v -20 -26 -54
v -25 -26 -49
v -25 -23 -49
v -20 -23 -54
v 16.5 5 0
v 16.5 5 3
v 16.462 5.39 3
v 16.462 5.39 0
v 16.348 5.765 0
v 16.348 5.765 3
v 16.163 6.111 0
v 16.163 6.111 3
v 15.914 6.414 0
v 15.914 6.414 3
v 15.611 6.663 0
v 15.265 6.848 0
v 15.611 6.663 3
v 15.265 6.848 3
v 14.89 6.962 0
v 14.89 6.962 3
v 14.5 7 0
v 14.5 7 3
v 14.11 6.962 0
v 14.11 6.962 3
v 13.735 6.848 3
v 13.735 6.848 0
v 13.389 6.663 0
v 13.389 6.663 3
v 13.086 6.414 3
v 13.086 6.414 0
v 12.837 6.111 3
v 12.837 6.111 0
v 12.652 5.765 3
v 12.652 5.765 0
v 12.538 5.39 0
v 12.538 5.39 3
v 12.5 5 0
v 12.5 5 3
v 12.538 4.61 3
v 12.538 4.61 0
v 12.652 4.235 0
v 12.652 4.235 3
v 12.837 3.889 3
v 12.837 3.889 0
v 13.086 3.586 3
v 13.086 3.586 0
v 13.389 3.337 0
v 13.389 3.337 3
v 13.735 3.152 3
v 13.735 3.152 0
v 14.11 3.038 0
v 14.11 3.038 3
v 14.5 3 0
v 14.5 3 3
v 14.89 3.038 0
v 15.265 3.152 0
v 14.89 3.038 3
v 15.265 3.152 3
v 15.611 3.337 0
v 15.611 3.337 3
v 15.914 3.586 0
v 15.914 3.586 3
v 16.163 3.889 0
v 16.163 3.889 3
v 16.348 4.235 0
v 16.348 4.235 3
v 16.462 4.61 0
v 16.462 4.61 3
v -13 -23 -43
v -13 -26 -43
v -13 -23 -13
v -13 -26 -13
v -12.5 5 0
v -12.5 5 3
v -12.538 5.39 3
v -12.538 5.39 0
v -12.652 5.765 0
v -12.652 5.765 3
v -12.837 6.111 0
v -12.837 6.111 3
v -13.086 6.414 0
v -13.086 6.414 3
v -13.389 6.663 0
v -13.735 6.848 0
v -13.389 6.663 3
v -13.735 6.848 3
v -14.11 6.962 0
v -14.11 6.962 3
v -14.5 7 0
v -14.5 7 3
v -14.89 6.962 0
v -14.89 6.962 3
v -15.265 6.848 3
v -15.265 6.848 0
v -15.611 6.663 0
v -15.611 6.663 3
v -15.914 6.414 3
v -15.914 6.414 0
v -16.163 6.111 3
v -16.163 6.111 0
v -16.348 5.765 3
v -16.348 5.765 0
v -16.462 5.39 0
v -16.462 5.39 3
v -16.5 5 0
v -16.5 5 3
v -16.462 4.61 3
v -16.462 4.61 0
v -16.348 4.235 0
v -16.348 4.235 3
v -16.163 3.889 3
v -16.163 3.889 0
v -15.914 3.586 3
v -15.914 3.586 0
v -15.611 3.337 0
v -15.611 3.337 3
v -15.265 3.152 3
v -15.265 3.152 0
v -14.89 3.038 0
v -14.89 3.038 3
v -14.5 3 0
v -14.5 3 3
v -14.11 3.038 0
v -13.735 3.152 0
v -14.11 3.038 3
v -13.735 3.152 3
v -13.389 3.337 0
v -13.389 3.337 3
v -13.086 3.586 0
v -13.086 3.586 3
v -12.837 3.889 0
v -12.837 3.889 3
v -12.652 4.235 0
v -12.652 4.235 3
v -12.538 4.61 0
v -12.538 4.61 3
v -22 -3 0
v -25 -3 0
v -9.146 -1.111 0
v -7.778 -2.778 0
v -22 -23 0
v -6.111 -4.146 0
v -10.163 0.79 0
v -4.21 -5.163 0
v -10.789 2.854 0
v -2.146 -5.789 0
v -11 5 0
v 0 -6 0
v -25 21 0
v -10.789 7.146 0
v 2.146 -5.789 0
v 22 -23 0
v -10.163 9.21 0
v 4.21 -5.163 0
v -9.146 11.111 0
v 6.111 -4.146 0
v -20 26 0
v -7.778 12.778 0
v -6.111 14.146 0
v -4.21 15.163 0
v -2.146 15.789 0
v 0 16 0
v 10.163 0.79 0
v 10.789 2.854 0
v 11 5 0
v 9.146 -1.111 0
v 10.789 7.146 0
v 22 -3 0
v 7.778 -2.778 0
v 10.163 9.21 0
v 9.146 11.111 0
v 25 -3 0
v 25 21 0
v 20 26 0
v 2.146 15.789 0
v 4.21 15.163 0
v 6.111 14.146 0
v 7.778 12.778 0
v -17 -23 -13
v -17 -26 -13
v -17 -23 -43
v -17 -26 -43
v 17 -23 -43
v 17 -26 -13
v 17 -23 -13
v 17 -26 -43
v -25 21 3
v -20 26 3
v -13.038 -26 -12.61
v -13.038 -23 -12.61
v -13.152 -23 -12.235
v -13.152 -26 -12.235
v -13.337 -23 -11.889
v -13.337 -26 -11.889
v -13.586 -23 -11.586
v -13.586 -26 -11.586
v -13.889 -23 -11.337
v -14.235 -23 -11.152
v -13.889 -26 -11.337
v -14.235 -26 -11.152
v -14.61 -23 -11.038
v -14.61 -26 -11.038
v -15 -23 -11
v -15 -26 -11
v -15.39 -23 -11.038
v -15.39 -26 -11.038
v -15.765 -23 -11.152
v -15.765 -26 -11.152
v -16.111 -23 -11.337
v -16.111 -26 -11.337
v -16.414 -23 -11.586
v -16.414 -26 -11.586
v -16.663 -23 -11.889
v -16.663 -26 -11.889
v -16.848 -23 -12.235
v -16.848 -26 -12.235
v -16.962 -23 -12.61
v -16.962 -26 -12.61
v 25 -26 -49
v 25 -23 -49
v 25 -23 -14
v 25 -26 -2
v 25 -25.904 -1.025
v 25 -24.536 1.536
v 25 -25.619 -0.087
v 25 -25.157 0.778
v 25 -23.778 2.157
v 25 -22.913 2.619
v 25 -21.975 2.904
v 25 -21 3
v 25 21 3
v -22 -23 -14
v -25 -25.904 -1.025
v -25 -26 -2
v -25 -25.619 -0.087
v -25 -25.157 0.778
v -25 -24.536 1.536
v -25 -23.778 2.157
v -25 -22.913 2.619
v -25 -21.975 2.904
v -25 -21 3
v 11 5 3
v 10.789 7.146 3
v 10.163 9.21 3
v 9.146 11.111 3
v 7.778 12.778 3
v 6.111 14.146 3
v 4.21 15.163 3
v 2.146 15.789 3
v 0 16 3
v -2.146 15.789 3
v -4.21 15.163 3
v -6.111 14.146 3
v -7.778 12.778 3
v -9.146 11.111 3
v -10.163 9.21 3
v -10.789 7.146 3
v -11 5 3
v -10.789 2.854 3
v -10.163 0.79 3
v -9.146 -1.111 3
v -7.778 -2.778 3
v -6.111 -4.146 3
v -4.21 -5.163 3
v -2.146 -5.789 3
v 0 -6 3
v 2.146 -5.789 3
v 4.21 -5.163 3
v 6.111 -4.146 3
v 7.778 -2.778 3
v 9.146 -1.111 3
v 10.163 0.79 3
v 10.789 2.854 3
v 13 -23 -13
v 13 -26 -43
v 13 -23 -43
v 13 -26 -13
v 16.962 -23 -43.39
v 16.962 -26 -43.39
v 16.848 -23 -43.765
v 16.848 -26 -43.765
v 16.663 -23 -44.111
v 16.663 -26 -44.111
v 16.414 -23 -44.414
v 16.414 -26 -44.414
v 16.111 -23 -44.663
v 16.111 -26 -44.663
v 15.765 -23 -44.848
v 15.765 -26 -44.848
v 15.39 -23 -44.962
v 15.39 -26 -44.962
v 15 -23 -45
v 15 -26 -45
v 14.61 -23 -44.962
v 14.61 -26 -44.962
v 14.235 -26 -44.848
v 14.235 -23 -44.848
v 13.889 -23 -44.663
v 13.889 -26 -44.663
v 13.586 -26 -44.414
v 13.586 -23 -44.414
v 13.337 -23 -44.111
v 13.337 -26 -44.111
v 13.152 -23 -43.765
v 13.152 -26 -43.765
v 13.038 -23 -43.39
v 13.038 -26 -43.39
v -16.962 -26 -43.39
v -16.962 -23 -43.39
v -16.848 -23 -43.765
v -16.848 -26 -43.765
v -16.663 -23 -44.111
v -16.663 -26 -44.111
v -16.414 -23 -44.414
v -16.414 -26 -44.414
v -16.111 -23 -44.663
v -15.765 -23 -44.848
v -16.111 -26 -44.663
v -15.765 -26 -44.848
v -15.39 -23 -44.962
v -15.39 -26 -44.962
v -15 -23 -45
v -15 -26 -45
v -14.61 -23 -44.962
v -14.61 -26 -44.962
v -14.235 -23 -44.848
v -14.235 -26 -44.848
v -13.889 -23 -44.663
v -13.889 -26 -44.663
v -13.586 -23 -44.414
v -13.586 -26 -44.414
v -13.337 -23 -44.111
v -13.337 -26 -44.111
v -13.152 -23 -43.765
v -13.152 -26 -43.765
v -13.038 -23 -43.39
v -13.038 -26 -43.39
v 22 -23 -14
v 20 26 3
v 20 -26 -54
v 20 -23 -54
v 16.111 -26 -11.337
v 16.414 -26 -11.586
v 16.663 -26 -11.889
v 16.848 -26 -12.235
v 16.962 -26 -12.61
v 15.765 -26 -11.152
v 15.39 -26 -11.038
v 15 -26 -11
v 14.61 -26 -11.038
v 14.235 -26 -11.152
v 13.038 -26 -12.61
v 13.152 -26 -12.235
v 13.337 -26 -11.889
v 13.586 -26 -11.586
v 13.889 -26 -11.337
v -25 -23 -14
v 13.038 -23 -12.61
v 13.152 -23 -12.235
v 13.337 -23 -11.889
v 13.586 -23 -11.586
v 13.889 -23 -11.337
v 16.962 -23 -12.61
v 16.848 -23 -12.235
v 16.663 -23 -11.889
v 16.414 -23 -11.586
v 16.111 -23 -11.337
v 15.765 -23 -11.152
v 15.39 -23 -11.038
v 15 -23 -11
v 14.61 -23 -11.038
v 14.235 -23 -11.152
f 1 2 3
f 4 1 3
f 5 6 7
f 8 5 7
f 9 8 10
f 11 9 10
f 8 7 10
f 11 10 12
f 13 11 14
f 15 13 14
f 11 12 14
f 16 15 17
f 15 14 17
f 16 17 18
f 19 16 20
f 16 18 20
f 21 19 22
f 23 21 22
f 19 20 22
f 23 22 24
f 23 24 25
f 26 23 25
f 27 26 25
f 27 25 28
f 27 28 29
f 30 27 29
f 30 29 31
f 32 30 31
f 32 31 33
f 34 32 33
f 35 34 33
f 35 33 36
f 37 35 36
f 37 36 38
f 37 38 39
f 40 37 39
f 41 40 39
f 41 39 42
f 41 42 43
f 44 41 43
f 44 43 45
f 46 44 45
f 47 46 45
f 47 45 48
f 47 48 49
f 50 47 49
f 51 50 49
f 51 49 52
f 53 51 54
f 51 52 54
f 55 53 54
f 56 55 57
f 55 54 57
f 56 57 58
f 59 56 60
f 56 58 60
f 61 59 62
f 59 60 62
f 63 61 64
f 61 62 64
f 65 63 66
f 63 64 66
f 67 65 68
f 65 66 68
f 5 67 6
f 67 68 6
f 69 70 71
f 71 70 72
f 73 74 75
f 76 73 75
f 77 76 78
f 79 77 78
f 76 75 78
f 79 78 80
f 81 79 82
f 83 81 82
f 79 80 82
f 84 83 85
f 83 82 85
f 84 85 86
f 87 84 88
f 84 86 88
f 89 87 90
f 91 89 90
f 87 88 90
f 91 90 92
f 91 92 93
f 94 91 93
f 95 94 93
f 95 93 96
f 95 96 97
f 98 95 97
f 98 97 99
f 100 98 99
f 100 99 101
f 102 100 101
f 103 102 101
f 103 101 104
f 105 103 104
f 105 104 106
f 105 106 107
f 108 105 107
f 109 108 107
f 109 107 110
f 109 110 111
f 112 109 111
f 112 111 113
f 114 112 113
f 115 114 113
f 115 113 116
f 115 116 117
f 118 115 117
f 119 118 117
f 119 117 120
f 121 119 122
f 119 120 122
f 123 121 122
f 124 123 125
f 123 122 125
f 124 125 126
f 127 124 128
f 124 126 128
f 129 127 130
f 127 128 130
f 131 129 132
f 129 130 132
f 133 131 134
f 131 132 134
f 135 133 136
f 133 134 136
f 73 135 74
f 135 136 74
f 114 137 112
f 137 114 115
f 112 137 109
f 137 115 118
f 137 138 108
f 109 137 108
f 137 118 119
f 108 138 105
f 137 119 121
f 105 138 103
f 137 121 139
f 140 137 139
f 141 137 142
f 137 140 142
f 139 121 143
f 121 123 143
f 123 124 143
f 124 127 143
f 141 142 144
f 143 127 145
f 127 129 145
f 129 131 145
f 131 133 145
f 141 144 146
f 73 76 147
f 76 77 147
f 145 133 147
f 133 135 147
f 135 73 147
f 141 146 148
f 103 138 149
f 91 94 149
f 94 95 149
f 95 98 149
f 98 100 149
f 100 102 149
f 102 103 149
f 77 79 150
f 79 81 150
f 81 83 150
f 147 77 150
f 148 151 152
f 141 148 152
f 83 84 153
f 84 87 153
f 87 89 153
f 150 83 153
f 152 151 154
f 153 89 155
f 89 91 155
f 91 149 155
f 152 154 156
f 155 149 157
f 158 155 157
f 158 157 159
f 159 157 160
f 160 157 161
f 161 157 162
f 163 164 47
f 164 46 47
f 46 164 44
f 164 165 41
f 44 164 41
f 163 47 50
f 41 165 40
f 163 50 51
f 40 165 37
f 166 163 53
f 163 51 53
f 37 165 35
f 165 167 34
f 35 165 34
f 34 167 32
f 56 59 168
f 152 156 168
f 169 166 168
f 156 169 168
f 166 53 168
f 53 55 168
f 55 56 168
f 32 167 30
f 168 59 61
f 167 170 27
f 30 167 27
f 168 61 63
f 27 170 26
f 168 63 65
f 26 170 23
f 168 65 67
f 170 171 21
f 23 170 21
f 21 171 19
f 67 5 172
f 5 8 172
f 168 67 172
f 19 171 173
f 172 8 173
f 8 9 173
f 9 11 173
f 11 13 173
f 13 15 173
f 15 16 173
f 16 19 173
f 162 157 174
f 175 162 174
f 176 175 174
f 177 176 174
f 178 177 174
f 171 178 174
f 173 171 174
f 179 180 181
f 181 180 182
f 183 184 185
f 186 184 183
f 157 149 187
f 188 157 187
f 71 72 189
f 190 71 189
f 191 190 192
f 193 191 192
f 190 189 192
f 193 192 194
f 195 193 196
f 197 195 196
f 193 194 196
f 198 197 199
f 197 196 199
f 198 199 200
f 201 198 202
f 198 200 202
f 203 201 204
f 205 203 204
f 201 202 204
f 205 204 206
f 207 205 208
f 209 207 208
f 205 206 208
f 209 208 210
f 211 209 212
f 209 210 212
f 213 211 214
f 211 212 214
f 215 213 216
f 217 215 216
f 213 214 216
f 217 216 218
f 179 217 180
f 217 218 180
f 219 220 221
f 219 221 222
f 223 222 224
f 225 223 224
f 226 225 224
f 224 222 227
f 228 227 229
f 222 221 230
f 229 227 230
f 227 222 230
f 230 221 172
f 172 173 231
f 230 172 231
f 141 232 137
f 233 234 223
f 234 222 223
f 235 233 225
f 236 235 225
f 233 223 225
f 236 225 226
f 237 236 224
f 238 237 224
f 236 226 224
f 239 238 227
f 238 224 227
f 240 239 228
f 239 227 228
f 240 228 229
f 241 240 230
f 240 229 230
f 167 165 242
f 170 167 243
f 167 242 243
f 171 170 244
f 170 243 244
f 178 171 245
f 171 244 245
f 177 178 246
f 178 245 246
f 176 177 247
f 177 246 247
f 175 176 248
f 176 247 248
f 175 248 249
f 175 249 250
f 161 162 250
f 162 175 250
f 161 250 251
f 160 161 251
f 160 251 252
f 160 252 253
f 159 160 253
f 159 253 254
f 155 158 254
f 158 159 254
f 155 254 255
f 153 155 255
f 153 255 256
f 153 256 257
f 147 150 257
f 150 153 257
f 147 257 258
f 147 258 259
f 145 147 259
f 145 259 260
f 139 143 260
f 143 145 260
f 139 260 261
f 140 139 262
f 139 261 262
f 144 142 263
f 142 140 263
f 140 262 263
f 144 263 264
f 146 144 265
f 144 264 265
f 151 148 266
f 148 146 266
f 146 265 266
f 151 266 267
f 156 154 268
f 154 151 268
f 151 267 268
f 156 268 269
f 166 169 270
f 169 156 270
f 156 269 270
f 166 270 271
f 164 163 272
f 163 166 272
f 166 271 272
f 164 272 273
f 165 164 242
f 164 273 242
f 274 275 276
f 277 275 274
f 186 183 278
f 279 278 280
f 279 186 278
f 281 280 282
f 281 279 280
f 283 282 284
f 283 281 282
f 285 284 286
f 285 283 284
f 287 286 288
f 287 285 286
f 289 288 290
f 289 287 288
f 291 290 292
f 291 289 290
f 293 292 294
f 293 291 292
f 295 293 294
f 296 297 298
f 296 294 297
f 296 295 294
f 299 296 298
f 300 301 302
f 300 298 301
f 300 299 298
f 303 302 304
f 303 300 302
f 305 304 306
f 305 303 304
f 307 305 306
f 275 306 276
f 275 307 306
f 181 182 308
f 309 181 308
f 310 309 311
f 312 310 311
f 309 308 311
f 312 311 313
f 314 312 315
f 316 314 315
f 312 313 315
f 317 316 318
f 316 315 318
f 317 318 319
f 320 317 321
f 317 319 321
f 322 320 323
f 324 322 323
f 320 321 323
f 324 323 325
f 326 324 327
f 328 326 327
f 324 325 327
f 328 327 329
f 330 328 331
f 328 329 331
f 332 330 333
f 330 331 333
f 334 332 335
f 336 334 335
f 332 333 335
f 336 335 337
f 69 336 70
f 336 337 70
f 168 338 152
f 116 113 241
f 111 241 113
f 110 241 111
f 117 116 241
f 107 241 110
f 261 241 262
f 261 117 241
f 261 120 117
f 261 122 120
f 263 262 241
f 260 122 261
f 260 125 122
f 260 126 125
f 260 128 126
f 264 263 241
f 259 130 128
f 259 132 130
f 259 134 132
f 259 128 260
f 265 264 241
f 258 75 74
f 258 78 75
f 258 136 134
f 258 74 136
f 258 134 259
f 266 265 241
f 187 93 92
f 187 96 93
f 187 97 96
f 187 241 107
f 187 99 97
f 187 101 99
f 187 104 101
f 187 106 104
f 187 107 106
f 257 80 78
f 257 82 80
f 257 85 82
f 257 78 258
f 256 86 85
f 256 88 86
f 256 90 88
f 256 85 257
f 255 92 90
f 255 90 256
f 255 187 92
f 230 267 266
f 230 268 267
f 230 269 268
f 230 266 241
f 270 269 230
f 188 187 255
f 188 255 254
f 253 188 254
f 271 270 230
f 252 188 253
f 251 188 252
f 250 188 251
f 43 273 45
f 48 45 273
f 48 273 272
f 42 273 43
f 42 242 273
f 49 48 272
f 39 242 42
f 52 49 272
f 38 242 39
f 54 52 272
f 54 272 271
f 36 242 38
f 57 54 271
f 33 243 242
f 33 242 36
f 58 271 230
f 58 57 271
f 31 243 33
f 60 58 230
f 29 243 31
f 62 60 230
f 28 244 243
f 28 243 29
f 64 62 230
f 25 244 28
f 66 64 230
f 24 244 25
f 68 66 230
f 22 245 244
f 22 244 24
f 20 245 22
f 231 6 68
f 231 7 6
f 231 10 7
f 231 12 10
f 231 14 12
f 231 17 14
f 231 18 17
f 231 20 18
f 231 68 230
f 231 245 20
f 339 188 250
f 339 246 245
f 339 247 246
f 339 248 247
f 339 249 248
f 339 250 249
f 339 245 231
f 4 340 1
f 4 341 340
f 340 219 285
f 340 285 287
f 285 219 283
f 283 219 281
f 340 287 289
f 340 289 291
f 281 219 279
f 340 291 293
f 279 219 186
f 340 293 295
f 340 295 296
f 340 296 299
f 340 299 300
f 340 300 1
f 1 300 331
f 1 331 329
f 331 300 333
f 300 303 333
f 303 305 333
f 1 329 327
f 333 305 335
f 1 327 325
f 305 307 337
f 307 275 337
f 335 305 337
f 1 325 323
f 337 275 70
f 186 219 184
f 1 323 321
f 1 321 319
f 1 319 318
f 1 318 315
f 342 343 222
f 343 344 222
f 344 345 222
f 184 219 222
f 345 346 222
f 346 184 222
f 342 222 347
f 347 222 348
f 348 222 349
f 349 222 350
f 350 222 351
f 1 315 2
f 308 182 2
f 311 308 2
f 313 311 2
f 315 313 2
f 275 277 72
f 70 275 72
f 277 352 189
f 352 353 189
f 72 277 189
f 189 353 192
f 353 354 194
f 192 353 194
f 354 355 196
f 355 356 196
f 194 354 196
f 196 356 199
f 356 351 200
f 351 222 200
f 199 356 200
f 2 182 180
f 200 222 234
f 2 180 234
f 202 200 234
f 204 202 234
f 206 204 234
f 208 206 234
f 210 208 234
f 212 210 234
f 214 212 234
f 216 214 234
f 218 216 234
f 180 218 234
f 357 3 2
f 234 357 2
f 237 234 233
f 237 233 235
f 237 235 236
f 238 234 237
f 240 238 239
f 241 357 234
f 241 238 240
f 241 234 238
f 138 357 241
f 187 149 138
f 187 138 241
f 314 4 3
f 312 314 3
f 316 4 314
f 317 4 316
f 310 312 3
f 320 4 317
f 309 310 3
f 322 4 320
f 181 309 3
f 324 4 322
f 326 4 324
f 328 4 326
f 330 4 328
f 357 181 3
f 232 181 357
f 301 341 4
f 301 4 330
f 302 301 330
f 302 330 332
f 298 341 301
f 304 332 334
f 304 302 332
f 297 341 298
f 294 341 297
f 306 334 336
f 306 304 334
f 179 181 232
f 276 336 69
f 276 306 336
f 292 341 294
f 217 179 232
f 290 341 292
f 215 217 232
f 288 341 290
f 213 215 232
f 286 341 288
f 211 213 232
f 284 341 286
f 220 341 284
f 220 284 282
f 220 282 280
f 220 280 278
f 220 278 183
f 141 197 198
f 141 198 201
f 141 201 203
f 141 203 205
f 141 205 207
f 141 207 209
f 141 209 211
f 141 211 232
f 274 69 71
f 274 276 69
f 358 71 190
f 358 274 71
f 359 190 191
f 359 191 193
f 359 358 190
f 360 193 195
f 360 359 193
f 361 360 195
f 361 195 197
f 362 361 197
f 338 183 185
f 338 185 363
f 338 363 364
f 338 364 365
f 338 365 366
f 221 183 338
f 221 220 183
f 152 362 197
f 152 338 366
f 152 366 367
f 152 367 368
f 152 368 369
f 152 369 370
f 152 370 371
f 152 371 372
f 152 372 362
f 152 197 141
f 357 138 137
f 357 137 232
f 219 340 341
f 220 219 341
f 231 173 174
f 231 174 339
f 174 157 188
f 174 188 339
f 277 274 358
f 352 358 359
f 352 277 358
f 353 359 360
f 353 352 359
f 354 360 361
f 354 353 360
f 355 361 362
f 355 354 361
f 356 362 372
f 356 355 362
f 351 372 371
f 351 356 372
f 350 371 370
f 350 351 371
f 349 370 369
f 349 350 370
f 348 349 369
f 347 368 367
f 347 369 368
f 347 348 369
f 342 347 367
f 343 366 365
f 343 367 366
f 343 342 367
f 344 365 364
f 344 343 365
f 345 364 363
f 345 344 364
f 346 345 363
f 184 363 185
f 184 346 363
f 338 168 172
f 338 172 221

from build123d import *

# Parameters (mm, degrees)
SKETCH_1_W          = 50
SKETCH_1_H          = 52
EXTRUDE_1_DEPTH     = 3
SKETCH_2_W          = 50
SKETCH_2_H          = 3
EXTRUDE_2_DEPTH     = 54
SKETCH_3_R          = 11
SKETCH_3_R_2        = 2
CUT_EXTRUDE_1_DEPTH = 68.453687816
CHAMFER_1_SIZE      = 5
CHAMFER_2_SIZE      = 5
CUT_EXTRUDE_2_DEPTH = 80.025312401
EXTRUDE_START       = -50
EXTRUDE_3_DEPTH     = 50
CUT_EXTRUDE_START   = -3
CUT_EXTRUDE_3_DEPTH = 44
FILLET_1_R          = 5


with BuildPart() as part:
    # 草圖1 → 填料-伸長1 (new body)
    with BuildSketch(Plane.XY):
        Rectangle(SKETCH_1_W, SKETCH_1_H)
    extrude(amount=EXTRUDE_1_DEPTH)

    # 草圖2 → 填料-伸長2 (add)
    with BuildSketch(Plane(origin=(0, 0, 0), x_dir=(-1, 0, 0), z_dir=(0, 0, -1))):
        with Locations((0, -24.5)):
            Rectangle(SKETCH_2_W, SKETCH_2_H)
    extrude(amount=EXTRUDE_2_DEPTH)

    # 草圖3 → 除料-伸長1 (cut, through all)
    with BuildSketch(Plane.XY.offset(3)):
        with Locations((0, 5)):
            Circle(SKETCH_3_R)
        with Locations((14.5, 5)):
            Circle(SKETCH_3_R_2)
        with Locations((-14.5, 5)):
            Circle(SKETCH_3_R_2)
    extrude(amount=-CUT_EXTRUDE_1_DEPTH, mode=Mode.SUBTRACT)

    # 導角1
    chamfer_1_edges = [part.edges().sort_by_distance(p)[0] for p in [
        (-25, 26, 1.5),
        (25, 26, 1.5),
    ]]
    chamfer(chamfer_1_edges, length=CHAMFER_1_SIZE)

    # 導角2
    chamfer_2_edges = [part.edges().sort_by_distance(p)[0] for p in [
        (25, -24.5, -54),
        (-25, -24.5, -54),
    ]]
    chamfer(chamfer_2_edges, length=CHAMFER_2_SIZE)

    # 草圖4 → 除料-伸長2 (cut, through all)
    with BuildSketch(Plane.XZ.offset(26)):
        with BuildLine():
            Line((13, -43), (13, -13))
            ThreePointArc((13, -13), (15, -11), (17, -13))
            Line((17, -13), (17, -43))
            ThreePointArc((17, -43), (15, -45), (13, -43))
        make_face()
        with BuildLine():
            Line((-13, -43), (-13, -13))
            ThreePointArc((-13, -13), (-15, -11), (-17, -13))
            Line((-17, -13), (-17, -43))
            ThreePointArc((-17, -43), (-15, -45), (-13, -43))
        make_face()
    extrude(amount=-CUT_EXTRUDE_2_DEPTH, mode=Mode.SUBTRACT)

    # 草圖5 → 填料-伸長3 (add)
    with BuildSketch(Plane(origin=(25, 0, 0), x_dir=(0, 0, -1), z_dir=(1, 0, 0)).offset(EXTRUDE_START)):
        Polygon((0, -23), (0, -3), (14, -23), align=None)
    extrude(amount=EXTRUDE_3_DEPTH)

    # 草圖6 → 除料-伸長3 (cut)
    with BuildSketch(Plane(origin=(25, 0, 0), x_dir=(0, 0, -1), z_dir=(1, 0, 0)).offset(CUT_EXTRUDE_START)):
        Polygon((0, -3), (14, -23), (0, -23), align=None)
    extrude(amount=-CUT_EXTRUDE_3_DEPTH, mode=Mode.SUBTRACT)

    # 圓角1
    fillet_1_edges = [part.edges().sort_by_distance(p)[0] for p in [
        (0, -26, 3),
    ]]
    fillet(fillet_1_edges, radius=FILLET_1_R)


solid = part.part
